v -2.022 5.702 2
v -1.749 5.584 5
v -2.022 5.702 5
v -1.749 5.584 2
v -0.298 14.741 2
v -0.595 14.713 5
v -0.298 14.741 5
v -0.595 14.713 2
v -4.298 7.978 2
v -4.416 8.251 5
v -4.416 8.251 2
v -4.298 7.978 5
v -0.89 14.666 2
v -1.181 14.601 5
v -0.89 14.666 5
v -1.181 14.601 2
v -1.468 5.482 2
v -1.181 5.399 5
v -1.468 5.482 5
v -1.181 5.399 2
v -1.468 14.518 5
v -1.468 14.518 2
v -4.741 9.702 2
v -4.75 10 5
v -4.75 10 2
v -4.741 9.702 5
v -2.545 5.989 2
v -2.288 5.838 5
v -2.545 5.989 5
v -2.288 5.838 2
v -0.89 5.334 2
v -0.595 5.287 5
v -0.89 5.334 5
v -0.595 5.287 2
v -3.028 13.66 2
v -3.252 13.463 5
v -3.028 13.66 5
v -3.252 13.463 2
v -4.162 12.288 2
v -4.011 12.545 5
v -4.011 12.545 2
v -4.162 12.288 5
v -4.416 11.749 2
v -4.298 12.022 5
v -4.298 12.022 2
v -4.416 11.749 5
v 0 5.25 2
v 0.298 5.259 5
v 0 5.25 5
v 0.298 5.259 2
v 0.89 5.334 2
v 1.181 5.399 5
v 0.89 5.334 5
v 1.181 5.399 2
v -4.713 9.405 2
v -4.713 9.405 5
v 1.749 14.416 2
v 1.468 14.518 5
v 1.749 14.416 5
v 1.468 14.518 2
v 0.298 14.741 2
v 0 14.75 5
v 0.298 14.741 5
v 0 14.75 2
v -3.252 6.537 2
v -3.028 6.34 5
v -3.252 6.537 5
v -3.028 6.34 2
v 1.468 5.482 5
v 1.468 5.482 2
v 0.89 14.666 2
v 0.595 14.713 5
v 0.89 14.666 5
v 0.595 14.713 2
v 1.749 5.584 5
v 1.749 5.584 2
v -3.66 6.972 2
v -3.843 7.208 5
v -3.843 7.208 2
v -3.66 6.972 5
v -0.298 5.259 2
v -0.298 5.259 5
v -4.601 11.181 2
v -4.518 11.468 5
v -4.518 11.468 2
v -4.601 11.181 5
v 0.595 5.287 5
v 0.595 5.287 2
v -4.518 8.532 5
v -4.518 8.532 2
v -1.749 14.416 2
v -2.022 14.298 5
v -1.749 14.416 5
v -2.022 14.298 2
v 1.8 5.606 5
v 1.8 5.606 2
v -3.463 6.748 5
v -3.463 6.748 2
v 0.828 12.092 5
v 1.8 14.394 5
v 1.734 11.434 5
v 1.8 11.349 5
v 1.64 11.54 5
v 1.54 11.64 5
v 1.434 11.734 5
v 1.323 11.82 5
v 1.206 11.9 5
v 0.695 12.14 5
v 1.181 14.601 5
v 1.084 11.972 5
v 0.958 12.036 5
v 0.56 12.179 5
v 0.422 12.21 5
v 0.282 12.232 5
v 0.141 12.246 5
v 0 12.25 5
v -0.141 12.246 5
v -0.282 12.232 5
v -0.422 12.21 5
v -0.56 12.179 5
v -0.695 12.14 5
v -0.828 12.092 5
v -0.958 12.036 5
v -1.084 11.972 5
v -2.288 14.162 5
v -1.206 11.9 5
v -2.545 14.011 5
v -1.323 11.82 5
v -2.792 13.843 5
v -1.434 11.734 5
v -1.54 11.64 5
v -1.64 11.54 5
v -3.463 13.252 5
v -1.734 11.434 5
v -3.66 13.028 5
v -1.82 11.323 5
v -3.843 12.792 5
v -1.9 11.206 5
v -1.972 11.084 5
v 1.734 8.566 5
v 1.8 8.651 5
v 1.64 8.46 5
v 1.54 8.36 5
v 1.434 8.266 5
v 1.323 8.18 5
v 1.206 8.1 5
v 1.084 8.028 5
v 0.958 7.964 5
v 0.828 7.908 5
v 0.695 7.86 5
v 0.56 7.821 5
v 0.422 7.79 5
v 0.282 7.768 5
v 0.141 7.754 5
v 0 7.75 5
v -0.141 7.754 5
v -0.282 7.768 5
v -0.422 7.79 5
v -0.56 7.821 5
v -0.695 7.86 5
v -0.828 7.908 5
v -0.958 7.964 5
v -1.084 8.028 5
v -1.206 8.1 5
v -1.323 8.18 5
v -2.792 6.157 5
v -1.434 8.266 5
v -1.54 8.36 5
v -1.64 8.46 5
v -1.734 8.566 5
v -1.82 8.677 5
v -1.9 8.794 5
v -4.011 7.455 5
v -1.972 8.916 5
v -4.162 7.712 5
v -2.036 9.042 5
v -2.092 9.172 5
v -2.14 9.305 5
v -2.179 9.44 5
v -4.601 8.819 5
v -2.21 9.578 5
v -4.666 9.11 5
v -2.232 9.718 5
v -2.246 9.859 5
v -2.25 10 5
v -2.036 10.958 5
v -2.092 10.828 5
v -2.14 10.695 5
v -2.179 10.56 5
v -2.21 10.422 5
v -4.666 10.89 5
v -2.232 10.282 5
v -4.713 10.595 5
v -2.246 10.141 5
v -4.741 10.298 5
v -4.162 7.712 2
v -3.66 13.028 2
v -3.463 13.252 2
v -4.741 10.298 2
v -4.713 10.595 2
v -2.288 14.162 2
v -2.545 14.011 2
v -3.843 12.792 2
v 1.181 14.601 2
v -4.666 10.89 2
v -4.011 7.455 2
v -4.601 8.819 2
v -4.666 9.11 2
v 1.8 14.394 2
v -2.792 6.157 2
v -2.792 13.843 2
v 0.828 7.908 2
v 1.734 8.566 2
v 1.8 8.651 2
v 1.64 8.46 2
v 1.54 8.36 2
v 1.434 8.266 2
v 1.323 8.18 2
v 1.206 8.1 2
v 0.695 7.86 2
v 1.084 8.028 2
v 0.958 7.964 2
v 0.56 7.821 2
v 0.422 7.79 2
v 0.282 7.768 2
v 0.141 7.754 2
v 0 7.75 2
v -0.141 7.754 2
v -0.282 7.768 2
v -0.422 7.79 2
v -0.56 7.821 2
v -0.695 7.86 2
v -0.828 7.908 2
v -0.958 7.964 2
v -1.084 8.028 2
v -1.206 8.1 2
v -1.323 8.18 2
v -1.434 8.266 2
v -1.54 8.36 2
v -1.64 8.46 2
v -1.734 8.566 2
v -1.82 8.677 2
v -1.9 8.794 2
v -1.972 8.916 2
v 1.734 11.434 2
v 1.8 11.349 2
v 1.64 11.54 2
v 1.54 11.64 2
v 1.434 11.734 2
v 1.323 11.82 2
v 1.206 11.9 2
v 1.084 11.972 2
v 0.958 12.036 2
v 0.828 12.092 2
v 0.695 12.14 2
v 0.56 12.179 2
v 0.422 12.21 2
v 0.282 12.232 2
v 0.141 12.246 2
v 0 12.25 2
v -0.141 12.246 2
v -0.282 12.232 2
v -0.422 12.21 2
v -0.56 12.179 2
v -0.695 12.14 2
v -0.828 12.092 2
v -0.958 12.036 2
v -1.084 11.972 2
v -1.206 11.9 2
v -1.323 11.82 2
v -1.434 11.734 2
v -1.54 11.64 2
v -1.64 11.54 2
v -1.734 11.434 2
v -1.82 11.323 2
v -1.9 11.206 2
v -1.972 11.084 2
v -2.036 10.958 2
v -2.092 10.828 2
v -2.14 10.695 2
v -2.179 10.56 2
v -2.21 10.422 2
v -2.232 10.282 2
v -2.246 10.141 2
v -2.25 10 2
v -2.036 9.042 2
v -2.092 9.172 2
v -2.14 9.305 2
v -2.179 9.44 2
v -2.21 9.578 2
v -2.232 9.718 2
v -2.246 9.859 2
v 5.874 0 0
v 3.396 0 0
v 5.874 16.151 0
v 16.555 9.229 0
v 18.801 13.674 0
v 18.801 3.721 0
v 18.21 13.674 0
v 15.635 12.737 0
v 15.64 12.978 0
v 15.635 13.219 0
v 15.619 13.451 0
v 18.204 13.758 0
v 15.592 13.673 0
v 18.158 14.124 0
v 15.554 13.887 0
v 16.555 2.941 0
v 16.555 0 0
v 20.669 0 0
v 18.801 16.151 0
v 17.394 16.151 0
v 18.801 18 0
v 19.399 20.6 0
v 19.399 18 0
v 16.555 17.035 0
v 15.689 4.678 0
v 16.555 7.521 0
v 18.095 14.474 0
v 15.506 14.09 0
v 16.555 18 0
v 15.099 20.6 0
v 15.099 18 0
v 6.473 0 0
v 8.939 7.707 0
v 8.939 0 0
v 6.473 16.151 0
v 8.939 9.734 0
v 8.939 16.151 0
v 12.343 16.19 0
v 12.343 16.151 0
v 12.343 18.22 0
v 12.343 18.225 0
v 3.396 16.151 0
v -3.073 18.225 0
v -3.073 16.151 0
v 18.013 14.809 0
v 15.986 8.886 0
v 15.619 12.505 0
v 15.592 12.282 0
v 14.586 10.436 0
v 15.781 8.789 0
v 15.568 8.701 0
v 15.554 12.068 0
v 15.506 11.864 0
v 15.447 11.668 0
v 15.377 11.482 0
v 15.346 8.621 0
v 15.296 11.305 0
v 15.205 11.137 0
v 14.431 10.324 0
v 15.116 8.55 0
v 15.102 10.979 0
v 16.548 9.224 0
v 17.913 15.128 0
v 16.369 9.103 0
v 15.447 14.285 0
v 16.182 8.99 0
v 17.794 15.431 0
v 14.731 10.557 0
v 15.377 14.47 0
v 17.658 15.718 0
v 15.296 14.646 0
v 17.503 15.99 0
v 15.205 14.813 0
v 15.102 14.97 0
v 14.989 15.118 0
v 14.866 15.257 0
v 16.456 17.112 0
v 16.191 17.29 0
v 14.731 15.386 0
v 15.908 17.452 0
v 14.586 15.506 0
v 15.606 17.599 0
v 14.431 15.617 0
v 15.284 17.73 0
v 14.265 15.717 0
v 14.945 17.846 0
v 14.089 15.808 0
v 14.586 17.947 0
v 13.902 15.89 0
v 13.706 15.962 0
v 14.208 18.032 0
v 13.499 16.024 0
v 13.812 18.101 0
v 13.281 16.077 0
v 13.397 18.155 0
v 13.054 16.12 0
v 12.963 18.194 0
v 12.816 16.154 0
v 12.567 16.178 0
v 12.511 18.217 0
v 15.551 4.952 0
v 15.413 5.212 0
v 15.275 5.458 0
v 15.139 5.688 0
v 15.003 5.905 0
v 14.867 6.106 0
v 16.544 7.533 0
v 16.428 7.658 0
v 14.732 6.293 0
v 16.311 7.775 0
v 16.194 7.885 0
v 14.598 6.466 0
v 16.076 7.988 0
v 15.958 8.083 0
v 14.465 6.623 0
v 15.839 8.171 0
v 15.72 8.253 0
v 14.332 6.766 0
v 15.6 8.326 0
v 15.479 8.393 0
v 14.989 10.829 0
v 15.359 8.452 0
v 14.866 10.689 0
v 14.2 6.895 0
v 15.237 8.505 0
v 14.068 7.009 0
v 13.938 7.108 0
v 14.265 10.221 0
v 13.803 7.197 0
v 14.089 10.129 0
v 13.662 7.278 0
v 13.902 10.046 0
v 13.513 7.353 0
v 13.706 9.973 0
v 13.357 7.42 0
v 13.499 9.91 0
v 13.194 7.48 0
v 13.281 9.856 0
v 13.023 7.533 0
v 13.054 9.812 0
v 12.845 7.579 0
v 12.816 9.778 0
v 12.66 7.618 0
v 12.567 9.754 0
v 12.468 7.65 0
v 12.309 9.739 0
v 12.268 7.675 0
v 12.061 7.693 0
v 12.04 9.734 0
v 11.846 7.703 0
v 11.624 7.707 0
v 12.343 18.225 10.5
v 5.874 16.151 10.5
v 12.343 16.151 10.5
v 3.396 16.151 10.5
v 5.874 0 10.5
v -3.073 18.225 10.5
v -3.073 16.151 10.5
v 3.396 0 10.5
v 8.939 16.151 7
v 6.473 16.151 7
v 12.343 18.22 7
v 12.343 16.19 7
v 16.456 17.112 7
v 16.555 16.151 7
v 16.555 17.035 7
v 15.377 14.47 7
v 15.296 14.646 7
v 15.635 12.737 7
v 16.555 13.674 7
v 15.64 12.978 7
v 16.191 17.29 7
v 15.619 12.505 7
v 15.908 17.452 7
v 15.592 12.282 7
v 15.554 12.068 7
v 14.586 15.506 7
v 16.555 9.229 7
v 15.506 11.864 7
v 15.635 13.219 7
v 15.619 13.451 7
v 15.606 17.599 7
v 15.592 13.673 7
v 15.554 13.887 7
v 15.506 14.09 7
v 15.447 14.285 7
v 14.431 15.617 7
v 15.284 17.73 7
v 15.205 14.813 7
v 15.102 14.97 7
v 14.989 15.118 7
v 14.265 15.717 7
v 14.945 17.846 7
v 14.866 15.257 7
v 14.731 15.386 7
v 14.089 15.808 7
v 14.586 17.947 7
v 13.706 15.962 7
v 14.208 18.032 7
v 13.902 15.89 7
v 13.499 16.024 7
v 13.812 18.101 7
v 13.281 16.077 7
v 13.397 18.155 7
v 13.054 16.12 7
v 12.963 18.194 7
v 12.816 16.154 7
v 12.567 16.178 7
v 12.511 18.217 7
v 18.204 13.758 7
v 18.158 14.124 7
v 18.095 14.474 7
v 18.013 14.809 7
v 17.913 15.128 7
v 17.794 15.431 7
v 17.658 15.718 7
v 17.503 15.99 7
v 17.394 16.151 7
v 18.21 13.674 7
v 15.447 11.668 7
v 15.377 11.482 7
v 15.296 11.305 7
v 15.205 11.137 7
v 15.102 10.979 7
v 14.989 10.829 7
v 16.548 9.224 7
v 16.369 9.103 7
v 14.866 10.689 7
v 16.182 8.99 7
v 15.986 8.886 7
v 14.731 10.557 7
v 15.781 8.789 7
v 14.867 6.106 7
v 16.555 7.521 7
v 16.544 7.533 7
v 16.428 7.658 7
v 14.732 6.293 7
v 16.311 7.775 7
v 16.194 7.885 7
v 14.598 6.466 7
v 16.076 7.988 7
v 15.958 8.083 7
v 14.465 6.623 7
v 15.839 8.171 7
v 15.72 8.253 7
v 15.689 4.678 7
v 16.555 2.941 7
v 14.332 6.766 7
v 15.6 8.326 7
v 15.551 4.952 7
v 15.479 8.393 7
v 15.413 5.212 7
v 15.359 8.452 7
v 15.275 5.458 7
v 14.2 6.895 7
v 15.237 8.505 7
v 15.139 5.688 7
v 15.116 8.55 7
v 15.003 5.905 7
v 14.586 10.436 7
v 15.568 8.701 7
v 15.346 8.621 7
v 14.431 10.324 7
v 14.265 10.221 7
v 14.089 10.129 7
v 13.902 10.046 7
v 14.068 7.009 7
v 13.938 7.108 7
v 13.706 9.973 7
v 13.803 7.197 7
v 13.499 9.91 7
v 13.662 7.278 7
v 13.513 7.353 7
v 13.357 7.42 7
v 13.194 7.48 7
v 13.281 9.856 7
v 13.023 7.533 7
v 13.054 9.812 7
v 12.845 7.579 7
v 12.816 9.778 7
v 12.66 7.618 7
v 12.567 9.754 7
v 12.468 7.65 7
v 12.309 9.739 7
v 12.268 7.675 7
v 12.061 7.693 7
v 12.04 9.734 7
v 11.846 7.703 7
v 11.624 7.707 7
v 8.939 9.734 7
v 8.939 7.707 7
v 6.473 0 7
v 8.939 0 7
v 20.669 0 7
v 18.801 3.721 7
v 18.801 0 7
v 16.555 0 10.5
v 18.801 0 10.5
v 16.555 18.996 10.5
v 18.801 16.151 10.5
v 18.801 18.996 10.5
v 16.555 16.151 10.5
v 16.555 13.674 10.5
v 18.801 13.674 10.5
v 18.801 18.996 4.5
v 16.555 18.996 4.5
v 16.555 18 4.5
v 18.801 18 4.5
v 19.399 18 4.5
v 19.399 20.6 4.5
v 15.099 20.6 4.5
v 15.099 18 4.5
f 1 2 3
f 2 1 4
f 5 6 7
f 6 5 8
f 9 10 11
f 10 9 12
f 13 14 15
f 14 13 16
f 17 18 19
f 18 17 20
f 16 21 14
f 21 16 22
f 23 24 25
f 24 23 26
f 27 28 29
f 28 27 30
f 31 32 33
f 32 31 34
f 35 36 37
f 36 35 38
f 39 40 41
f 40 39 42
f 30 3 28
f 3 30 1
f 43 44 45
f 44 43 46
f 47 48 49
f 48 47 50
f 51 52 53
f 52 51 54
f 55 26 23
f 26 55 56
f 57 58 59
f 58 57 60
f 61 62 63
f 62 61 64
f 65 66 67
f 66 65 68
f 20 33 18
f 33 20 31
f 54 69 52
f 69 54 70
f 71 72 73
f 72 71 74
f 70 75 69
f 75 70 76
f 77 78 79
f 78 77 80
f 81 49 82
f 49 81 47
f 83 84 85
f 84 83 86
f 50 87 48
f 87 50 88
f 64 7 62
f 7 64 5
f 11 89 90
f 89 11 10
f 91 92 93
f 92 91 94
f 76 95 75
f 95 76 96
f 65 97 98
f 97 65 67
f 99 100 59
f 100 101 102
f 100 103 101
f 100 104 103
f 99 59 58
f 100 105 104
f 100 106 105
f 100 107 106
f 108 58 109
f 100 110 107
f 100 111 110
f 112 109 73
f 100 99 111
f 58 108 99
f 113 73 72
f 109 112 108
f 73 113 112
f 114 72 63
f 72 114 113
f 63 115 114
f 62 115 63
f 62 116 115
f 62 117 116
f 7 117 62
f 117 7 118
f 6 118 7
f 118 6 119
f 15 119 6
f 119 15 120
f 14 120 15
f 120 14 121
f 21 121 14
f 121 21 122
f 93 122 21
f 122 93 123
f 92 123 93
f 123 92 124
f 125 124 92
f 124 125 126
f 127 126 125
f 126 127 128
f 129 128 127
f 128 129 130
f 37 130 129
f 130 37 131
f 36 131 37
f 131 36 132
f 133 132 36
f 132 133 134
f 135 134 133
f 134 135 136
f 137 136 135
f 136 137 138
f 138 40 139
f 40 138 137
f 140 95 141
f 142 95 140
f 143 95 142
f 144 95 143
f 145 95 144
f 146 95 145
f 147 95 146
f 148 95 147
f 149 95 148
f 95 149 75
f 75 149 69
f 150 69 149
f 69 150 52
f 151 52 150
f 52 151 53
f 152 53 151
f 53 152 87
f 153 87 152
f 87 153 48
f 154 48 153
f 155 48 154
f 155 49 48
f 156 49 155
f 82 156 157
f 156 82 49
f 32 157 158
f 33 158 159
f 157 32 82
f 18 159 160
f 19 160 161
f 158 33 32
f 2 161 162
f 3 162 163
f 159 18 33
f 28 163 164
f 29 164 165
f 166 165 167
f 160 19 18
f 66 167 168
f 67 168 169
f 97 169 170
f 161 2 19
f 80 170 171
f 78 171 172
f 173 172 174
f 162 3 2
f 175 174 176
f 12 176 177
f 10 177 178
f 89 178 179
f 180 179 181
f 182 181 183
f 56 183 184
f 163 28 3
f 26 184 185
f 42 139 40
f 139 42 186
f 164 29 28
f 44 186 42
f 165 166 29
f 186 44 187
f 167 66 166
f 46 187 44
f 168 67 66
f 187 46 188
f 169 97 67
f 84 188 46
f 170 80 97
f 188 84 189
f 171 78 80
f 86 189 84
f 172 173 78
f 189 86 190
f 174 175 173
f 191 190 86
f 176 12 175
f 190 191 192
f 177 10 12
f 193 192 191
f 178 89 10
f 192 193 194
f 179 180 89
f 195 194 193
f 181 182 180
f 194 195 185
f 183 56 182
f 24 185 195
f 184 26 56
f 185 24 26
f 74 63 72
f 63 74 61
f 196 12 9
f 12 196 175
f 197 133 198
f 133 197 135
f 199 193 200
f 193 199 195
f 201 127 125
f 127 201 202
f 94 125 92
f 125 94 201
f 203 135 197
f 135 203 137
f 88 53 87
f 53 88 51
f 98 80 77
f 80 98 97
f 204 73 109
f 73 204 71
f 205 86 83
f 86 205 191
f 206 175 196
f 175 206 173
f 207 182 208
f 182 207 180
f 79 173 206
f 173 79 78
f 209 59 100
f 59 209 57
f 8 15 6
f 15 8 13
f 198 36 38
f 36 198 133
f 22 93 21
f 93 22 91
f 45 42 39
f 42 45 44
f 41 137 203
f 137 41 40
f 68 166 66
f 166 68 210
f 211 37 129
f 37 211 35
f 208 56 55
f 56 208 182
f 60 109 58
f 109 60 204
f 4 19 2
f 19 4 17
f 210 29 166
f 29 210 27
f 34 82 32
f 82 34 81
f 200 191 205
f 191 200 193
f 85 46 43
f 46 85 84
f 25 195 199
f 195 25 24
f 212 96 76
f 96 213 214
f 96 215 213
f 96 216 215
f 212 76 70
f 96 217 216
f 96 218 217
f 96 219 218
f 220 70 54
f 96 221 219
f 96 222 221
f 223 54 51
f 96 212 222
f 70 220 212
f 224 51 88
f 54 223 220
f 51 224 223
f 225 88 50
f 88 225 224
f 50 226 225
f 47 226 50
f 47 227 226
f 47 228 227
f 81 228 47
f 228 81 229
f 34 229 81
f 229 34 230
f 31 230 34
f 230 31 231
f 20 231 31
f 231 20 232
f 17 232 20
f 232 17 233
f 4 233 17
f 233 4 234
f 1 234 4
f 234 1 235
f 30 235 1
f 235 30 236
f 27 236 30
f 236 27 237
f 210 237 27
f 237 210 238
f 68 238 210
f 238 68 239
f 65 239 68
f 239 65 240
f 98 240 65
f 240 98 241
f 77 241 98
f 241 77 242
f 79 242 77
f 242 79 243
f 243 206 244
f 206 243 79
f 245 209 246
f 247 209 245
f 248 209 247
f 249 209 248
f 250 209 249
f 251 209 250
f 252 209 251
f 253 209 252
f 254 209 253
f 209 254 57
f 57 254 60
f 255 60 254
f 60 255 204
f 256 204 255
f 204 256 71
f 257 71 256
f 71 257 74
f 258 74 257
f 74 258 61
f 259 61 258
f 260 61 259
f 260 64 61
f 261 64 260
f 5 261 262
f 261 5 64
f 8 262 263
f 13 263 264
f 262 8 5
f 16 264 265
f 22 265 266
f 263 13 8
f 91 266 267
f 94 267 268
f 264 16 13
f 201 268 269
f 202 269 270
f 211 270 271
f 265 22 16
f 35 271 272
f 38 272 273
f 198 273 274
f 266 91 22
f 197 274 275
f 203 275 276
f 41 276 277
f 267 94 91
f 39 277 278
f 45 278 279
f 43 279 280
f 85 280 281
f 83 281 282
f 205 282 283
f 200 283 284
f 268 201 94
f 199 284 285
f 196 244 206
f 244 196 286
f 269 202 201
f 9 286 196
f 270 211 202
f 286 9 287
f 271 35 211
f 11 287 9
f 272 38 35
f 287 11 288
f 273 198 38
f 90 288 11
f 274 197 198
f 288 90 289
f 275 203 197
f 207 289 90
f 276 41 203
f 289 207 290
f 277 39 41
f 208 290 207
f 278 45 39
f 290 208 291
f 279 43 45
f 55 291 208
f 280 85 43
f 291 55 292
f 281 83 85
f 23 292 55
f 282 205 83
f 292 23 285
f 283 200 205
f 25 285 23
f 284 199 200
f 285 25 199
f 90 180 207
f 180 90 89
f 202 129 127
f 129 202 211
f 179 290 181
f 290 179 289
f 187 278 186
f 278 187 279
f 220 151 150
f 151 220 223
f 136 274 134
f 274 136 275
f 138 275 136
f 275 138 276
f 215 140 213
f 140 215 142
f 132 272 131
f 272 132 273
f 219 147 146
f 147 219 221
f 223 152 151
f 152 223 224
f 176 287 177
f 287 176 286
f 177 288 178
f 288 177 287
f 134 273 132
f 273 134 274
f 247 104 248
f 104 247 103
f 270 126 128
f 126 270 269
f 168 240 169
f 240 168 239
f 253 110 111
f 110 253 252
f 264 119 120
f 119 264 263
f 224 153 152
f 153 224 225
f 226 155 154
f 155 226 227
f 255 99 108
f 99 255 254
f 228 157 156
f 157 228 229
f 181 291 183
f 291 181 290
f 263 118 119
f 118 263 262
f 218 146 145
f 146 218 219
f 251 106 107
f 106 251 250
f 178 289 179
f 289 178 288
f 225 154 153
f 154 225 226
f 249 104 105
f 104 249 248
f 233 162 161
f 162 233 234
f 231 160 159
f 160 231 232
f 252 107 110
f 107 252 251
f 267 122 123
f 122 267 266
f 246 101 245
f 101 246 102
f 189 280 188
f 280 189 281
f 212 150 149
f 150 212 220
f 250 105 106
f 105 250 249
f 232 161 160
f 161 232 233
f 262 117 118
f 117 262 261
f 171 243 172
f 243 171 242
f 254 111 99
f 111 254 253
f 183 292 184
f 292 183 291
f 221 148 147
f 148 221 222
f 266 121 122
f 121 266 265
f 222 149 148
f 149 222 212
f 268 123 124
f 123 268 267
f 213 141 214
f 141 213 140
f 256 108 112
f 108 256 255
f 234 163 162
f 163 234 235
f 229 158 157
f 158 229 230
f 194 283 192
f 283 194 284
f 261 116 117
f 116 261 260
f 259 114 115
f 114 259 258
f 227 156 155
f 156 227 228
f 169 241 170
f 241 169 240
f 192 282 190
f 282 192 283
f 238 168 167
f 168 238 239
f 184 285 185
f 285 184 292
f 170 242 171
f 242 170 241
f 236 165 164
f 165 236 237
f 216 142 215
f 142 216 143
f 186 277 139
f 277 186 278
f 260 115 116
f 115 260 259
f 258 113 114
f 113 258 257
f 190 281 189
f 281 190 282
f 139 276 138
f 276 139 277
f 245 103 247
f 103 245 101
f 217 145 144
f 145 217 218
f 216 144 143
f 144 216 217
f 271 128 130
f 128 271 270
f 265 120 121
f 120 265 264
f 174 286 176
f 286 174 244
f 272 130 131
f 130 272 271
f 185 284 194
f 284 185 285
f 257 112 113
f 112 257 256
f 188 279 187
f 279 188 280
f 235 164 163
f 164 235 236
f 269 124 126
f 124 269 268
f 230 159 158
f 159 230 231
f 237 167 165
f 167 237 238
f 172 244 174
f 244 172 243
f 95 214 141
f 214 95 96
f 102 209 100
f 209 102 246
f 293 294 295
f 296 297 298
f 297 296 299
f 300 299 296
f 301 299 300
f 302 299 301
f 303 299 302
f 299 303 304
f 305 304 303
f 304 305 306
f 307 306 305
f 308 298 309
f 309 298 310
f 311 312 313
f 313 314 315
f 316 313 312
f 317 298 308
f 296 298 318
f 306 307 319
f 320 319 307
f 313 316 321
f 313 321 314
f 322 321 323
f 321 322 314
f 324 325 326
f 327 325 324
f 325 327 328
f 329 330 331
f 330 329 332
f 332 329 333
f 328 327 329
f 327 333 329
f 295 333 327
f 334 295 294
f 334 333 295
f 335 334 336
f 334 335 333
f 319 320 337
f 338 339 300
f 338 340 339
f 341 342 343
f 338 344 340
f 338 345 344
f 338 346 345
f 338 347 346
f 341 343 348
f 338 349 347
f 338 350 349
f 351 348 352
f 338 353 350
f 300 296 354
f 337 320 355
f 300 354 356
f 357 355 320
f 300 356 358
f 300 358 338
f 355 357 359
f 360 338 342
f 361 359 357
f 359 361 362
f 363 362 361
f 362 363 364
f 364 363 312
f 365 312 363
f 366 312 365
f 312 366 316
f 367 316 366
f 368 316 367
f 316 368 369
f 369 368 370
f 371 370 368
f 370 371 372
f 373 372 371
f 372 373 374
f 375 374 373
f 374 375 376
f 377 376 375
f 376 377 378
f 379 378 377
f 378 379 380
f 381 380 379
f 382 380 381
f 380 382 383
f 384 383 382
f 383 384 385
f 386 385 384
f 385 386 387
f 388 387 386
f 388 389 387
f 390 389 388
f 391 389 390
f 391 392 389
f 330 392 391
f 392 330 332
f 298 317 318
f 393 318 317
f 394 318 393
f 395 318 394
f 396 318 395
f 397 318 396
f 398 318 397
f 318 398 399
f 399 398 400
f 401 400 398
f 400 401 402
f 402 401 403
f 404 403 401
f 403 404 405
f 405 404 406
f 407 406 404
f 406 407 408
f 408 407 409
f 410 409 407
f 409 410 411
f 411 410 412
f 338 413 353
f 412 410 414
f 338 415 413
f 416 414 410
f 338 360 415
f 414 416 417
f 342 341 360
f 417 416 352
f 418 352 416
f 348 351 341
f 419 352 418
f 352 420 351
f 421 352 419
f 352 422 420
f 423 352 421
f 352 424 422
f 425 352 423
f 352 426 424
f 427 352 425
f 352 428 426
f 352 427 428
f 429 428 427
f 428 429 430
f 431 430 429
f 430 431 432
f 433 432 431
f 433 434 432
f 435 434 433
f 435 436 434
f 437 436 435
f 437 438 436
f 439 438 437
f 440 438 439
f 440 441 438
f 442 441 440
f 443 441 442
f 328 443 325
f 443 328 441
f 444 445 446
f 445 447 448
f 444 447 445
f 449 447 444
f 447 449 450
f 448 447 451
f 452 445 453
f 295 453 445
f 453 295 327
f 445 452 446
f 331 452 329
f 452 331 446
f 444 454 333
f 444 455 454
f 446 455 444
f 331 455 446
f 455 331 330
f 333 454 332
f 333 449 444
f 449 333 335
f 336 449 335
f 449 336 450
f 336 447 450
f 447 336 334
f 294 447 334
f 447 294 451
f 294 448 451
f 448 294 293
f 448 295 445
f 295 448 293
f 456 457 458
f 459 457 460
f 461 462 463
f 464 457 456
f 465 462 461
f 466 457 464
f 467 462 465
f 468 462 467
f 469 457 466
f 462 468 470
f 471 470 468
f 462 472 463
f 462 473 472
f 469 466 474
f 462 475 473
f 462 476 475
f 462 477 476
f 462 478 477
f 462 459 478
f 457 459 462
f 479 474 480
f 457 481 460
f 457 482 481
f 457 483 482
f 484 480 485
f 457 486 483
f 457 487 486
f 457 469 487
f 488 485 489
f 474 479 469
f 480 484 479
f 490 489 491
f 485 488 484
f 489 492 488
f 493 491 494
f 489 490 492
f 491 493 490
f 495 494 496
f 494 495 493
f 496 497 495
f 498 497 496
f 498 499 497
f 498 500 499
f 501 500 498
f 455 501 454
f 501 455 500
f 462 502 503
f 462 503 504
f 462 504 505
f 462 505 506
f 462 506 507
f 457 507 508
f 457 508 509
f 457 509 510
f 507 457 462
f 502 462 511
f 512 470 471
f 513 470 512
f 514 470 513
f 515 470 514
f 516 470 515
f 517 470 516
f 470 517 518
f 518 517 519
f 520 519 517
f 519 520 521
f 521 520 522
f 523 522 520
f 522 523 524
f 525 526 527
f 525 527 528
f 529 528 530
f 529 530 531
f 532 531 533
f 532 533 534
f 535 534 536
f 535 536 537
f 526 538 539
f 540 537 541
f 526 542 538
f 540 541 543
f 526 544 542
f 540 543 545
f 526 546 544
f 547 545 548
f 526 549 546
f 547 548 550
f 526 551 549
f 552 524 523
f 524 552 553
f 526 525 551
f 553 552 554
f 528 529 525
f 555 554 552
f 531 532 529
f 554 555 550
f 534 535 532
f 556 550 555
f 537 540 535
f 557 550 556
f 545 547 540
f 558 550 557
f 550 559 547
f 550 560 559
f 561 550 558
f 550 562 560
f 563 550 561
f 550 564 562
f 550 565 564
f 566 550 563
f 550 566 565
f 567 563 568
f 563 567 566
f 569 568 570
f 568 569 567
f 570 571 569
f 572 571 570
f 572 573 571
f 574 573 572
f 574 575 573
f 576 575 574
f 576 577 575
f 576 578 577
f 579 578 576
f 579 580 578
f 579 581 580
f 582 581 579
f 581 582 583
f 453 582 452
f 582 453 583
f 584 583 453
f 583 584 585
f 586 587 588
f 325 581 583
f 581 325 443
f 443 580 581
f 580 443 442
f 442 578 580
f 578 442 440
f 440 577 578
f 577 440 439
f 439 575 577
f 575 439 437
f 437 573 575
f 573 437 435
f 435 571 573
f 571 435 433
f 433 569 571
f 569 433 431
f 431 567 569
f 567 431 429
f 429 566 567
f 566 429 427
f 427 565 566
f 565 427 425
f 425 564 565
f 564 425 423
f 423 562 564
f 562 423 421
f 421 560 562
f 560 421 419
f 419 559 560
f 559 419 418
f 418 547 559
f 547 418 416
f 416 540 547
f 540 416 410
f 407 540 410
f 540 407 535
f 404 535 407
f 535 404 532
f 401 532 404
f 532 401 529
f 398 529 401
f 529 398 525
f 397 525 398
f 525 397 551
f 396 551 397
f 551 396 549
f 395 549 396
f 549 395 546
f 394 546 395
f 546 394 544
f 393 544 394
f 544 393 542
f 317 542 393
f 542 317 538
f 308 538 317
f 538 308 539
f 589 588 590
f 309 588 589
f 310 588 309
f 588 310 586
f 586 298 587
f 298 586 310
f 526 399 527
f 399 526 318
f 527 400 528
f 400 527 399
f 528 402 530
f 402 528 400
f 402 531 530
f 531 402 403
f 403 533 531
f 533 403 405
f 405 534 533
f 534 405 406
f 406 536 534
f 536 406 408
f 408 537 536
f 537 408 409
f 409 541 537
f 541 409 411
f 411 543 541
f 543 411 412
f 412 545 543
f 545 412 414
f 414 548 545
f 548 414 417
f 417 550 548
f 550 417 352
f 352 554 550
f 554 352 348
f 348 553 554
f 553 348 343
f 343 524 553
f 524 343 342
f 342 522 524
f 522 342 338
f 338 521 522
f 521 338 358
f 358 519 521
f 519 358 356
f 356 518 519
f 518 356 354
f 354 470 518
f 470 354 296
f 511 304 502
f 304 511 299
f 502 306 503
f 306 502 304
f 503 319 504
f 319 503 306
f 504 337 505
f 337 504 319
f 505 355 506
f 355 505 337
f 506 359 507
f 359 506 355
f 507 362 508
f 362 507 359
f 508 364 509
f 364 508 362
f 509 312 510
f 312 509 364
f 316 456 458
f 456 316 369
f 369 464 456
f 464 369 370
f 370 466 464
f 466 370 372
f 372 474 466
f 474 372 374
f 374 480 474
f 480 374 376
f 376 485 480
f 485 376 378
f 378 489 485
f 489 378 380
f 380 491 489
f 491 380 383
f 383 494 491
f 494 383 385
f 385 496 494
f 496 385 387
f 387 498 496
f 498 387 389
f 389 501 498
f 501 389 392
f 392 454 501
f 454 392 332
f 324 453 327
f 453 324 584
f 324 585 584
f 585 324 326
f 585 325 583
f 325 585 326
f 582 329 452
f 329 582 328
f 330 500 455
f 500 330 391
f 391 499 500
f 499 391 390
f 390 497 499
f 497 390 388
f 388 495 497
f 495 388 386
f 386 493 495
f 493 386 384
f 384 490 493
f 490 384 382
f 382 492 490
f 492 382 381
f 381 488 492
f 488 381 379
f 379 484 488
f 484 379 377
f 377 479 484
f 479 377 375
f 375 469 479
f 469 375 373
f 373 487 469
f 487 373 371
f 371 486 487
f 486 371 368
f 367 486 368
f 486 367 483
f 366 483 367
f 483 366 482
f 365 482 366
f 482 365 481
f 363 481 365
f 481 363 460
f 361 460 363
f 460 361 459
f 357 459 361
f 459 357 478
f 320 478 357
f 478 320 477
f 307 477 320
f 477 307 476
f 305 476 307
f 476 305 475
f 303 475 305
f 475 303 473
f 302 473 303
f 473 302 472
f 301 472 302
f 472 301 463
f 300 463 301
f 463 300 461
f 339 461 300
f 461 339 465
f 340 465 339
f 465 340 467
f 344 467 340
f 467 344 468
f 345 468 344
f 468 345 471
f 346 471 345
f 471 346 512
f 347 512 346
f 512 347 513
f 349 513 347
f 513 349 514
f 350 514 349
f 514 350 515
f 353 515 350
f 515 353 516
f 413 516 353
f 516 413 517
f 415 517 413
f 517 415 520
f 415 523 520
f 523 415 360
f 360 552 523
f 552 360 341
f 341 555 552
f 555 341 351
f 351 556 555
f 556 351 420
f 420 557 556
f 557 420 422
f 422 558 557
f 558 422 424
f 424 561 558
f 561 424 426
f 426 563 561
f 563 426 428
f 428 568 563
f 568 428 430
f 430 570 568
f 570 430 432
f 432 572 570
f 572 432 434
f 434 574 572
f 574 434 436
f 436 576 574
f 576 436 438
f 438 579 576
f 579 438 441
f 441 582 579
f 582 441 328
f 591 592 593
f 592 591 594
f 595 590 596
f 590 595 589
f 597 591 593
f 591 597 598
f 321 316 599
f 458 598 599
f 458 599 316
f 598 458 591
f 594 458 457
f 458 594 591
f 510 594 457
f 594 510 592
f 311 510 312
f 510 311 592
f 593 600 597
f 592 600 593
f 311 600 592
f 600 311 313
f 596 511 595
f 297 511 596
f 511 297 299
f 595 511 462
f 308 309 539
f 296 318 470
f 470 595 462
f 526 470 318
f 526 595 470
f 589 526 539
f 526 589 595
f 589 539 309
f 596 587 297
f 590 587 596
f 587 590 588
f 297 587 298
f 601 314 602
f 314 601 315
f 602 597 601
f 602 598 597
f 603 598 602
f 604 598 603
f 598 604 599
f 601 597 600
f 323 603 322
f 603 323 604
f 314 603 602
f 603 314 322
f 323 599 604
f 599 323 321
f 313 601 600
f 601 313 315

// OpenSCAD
/* [Text] */
// Text
text = "TRi";

/* [General Settings] */
// Font
font = "Anton"; // [Archivo Black, Bangers, Bungee, Changa One, Bebas Neue, Poppins Black]

// Font size
font_size = 18; // [5:1:50]

// Global spacing multiplier
spacing = 0.65; // [0.1:0.05:2]

// Use automatic spacing based on character width
use_auto_spacing = true; // [true,false]

/* [Colors] */
// Use single color
use_single_color = true; // [true,false]


keychainHoleSize = 4.5; // Diameter of the keychain hole
keychainHoleOffset = -2;// Offset of the keychain hole from the left
// Radius of edge, Increase to fill in gaps
r = 2;

// Box customization parameters
boxWidth = 0;      // Width of the box
boxHeight = 0;     // Height of the box
boxXOffset = 0;     // Horizontal offset for the box
boxYOffset = -30;   // Vertical offset for the box
// Color array definition
$fn = 100;
thickness = 4;
available_colors = [
    ["Red", [1, 0, 0]],
    ["Dark Red", [0.5, 0, 0]],
    ["Green", [0, 1, 0]],
    ["Dark Green", [0, 0.5, 0]],
    ["Blue", [0, 0, 1]],
    ["Dark Blue", [0, 0, 0.5]],
    ["Yellow", [1, 1, 0]],
    ["Orange", [1, 0.5, 0]],
    ["Purple", [0.5, 0, 0.5]],
    ["Pink", [1, 0.4, 0.7]],
    ["White", [1, 1, 1]],
    ["Black", [0, 0, 0]],
    ["Light Gray", [0.8, 0.8, 0.8]],
    ["Dark Gray", [0.3, 0.3, 0.3]],
    ["Turquoise", [0, 0.8, 0.8]]
];

// General color
general_color = "Green";

// Ring color
ring_color = "Green";

/* [Individual Adjustments] */
position_1  = 0;
position_2  = 0;
position_3  = 0;
position_4  = 0;
position_5  = 0;
position_6  = 0;
position_7  = 0;
position_8  = 0;
position_9  = 0;
position_10 = 0;
position_11 = 0;
position_12 = 0;

/* [Heights] */
// Height for odd letters
odd_height = 10.5; // [1:0.5:10]

// Height for even letters
even_height = 7; // [1:0.5:10]

/* [Ring] */
show_ring = true;
ring_x = -4.0;
ring_y = 0.5;
ring_height = 3;
ring_size = 8;

/* [Lowercase i Connector] */
enable_i_connector = true; // [true,false]
i_connector_width  = 4.3;  // [0.4:0.1:2]
i_connector_depth  = 2.6;  // [0.4:0.1:2]

/* ========================================================= */
/* ===================== FUNCTIONS ========================= */
/* ========================================================= */

function get_color_rgb(color_name) =
    let(c = [for(x = available_colors) if (x[0] == color_name) x[1]])
    len(c) > 0 ? c[0] : [1,1,1];

function get_height(pos) =
    (pos % 2 == 0) ? odd_height : even_height;

function get_adjustment(pos) =
    pos == 0  ? position_1  :
    pos == 1  ? position_2  :
    pos == 2  ? position_3  :
    pos == 3  ? position_4  :
    pos == 4  ? position_5  :
    pos == 5  ? position_6  :
    pos == 6  ? position_7  :
    pos == 7  ? position_8  :
    pos == 8  ? position_9  :
    pos == 9  ? position_10 :
    pos == 10 ? position_11 :
    pos == 11 ? position_12 : 0;

function get_ring_y_offset(c) =
    in_string(c, 
    "S" ) ? 16 // atas
    : in_string(c,
    "s" ) ? 13 // atas
    : in_string(c,
    "ZJ2a" ) ? 6 // bawah
    : 10; // normal


function get_cumulative_adjustment(pos) =
    pos < 0 ? 0 :
    get_cumulative_adjustment(pos - 1) + get_adjustment(pos);
// Character width heuristic
function in_string(c, s) = len(search(c, s)) > 0;

function get_letter_width(c) =
    in_string(c, 
    "I" ) ? 0.3
    : in_string(c, 
    "ilI!j|[]'.," ) ? 0.36
    : in_string(c, 
    "ft") ? 0.45
    : in_string(c, 
    "r1") ? 0.52
    : in_string(c,
    "0123456789TFE") ? 0.6
    : in_string(c,
    "zZLy") ? 0.7
    : in_string(c,
    "vxSJY") ? 0.8
    : in_string(c, 
    "w") ? 1.15
    : in_string(c, 
    "WmM@#") ? 1.35
    : in_string(c, 
    "@") ? 1.5
    : 0.87;

function get_auto_spacing(pos) =
    pos < 0 ? 0 :
    get_auto_spacing(pos - 1)
    + (font_size * spacing * get_letter_width(text[pos]));

function is_lowercase_i(c) = c == "i" || c == "j";

kerning_pairs = [
    ["AV", -0.1],
    ["VA", -0.12],
    ["AW", -0.1],
    ["WA", -0.1],
    ["AT", -0.06],
    ["TA", -0.05],
    ["AY", -0.1],
    ["YA", -0.1],
    ["PA", -0.09],
    ["TT", 0.1],
    
    ["wa", 0.1],
    ["ya", -0.06],
    ["tt", 0.1],
    ["wt", 0.1],
    ["wt", 0.1],
    ["wv", 0.06],
    ["yw", -0.06],
    ["yv", -0.06],
    ["aw", -0.06],
    ["ij", -0.05],
    ["Ij", -0.05],
    ["je", -0.1],
    ["ji", -0.15],
    ["aT", -0.05],
    ["Ta", -0.05],
    ["At", -0.05],
    ["tA", -0.05],
    ["at", -0.05],
    ["ta", -0.05],
    ["ox", -0.05],
    ["xo", -0.05],
    ["Tv", -0.05],
    ["vT", -0.05],
    ["rJ", -0.13],
    ["Yx", -0.1],
    ["xY", -0.1],
    ["Yr", -0.1],
    ["YJ", -0.2],
    ["Yy", -0.1],
    ["Tx", -0.05],
    ["xT", -0.05],
    ["Rj", -0.05],
    ["Xy", -0.08],
    ["Yj", -0.08],
    ["vJ", -0.08],
    ["VJ", -0.08],
    ["Vj", -0.08],
    ["vj", -0.08],
    ["WJ", -0.08],
    ["wJ", -0.08],
    ["YC", -0.05],
    ["CY", -0.05],
    ["YG", -0.05],
    ["GY", -0.05],
    ["LY", -0.25],
    ["OY", -0.05],
    ["YO", -0.05],
    ["QY", -0.05],
    ["YQ", -0.05],
    ["PY", -0.05],
    ["aY", -0.1],
    ["Ya", -0.1],
    ["Yb", -0.1],
    ["cY", -0.1],
    ["Yc", -0.1],
    ["dY", -0.1],
    ["eY", -0.1],
    ["Ye", -0.1],
    ["fY", -0.08],
    ["Yg", -0.1],
    ["Ym", -0.1],
    ["nY", -0.1],
    ["Yn", -0.1],
    ["oY", -0.1],
    ["Yo", -0.1],
    ["pY", -0.1],
    ["Yp", -0.1],
    ["qY", -0.1],
    ["Yq", -0.1],
    ["sY", -0.1],
    ["Ys", -0.1],
    ["uY", -0.08],
    ["Yu", -0.08],
    ["vY", -0.08],
    ["Yv", -0.08],
    ["Yw", -0.08],
    ["Yz", -0.08],
    ["ra", -0.03],
    ["re", -0.03],
    ["rs", -0.03],
    ["rq", -0.03],
    ["Le", -0.12],
    ["Lo", -0.12],
    ["Lq", -0.12],
    ["La", -0.12],
    ["Ld", -0.12],
];

// Adjustment untuk satu posisi (non kumulatif)
function get_pair_adjustment_single(pos, i=0) =
    pos <= 0 ? 0 :
    let(pair = str(text[pos-1], text[pos]))
    (
        i >= len(kerning_pairs) ? 0 :
        pair == kerning_pairs[i][0]
            ? font_size * spacing * kerning_pairs[i][1]
            : get_pair_adjustment_single(pos, i+1)
    );

// Kerning kumulatif sampai posisi sekarang
function get_pair_adjustment(pos) =
    pos < 0 ? 0 :
    get_pair_adjustment(pos - 1)
    + get_pair_adjustment_single(pos);

function get_first_letter_offset() =
in_string(text[0], 
    "TY" ) ? -3 : 
in_string(text[0], 
    "vVy" ) ? -1 : 0;
/* ========================================================= */
/* ===================== RENDER ============================ */
/* ========================================================= */

// Ring
// Ring 2/3 (clipped on right side)
if (show_ring) {

    ring_x_pos = -keychainHoleOffset - 2;
    ring_y_pos = get_ring_y_offset(text[0]);

    difference() {

        // Donut
        difference() {
            translate([ring_x_pos, ring_y_pos, 2])
                cylinder(h = ring_height, d = keychainHoleSize + 5);

            translate([ring_x_pos, ring_y_pos, 1])
                cylinder(h = ring_height + 2, d = keychainHoleSize);
        }

        // Cut right side (biar jadi 2/3)
        translate([ring_x_pos +1.8, ring_y_pos - 20, -2])
            cube([20, 40, ring_height + 4]);
    }
}

my_scale = len(text) > 10 ? 0.9 : 1;

// Letters
scale([my_scale, my_scale, 1])
for (i = [0 : len(text) - 1]) {

    pos_x =
    (use_auto_spacing
        ? get_auto_spacing(i - 1)
        : i * font_size * spacing)
    + get_cumulative_adjustment(i)
    + get_pair_adjustment(i)
    + get_first_letter_offset();

    // Main letter
    color(get_color_rgb(general_color))
    translate([pos_x, 0, 0])
    linear_extrude(height = get_height(i))
    text(
        text[i],
        font = font,
        size = font_size,
        kerning = true
    );

    // Connector for lowercase "i"
    if (enable_i_connector && is_lowercase_i(text[i])) {

        translate([
            pos_x + font_size * (text[i] == "i" ? 0.05 : 0.075),
            18,
            0
        ])
        color(get_color_rgb(general_color))
        cube([
            i_connector_width,
            i_connector_depth,
            font_size * 0.25   // intentionally tall to reach dot
        ]);
    }
}
